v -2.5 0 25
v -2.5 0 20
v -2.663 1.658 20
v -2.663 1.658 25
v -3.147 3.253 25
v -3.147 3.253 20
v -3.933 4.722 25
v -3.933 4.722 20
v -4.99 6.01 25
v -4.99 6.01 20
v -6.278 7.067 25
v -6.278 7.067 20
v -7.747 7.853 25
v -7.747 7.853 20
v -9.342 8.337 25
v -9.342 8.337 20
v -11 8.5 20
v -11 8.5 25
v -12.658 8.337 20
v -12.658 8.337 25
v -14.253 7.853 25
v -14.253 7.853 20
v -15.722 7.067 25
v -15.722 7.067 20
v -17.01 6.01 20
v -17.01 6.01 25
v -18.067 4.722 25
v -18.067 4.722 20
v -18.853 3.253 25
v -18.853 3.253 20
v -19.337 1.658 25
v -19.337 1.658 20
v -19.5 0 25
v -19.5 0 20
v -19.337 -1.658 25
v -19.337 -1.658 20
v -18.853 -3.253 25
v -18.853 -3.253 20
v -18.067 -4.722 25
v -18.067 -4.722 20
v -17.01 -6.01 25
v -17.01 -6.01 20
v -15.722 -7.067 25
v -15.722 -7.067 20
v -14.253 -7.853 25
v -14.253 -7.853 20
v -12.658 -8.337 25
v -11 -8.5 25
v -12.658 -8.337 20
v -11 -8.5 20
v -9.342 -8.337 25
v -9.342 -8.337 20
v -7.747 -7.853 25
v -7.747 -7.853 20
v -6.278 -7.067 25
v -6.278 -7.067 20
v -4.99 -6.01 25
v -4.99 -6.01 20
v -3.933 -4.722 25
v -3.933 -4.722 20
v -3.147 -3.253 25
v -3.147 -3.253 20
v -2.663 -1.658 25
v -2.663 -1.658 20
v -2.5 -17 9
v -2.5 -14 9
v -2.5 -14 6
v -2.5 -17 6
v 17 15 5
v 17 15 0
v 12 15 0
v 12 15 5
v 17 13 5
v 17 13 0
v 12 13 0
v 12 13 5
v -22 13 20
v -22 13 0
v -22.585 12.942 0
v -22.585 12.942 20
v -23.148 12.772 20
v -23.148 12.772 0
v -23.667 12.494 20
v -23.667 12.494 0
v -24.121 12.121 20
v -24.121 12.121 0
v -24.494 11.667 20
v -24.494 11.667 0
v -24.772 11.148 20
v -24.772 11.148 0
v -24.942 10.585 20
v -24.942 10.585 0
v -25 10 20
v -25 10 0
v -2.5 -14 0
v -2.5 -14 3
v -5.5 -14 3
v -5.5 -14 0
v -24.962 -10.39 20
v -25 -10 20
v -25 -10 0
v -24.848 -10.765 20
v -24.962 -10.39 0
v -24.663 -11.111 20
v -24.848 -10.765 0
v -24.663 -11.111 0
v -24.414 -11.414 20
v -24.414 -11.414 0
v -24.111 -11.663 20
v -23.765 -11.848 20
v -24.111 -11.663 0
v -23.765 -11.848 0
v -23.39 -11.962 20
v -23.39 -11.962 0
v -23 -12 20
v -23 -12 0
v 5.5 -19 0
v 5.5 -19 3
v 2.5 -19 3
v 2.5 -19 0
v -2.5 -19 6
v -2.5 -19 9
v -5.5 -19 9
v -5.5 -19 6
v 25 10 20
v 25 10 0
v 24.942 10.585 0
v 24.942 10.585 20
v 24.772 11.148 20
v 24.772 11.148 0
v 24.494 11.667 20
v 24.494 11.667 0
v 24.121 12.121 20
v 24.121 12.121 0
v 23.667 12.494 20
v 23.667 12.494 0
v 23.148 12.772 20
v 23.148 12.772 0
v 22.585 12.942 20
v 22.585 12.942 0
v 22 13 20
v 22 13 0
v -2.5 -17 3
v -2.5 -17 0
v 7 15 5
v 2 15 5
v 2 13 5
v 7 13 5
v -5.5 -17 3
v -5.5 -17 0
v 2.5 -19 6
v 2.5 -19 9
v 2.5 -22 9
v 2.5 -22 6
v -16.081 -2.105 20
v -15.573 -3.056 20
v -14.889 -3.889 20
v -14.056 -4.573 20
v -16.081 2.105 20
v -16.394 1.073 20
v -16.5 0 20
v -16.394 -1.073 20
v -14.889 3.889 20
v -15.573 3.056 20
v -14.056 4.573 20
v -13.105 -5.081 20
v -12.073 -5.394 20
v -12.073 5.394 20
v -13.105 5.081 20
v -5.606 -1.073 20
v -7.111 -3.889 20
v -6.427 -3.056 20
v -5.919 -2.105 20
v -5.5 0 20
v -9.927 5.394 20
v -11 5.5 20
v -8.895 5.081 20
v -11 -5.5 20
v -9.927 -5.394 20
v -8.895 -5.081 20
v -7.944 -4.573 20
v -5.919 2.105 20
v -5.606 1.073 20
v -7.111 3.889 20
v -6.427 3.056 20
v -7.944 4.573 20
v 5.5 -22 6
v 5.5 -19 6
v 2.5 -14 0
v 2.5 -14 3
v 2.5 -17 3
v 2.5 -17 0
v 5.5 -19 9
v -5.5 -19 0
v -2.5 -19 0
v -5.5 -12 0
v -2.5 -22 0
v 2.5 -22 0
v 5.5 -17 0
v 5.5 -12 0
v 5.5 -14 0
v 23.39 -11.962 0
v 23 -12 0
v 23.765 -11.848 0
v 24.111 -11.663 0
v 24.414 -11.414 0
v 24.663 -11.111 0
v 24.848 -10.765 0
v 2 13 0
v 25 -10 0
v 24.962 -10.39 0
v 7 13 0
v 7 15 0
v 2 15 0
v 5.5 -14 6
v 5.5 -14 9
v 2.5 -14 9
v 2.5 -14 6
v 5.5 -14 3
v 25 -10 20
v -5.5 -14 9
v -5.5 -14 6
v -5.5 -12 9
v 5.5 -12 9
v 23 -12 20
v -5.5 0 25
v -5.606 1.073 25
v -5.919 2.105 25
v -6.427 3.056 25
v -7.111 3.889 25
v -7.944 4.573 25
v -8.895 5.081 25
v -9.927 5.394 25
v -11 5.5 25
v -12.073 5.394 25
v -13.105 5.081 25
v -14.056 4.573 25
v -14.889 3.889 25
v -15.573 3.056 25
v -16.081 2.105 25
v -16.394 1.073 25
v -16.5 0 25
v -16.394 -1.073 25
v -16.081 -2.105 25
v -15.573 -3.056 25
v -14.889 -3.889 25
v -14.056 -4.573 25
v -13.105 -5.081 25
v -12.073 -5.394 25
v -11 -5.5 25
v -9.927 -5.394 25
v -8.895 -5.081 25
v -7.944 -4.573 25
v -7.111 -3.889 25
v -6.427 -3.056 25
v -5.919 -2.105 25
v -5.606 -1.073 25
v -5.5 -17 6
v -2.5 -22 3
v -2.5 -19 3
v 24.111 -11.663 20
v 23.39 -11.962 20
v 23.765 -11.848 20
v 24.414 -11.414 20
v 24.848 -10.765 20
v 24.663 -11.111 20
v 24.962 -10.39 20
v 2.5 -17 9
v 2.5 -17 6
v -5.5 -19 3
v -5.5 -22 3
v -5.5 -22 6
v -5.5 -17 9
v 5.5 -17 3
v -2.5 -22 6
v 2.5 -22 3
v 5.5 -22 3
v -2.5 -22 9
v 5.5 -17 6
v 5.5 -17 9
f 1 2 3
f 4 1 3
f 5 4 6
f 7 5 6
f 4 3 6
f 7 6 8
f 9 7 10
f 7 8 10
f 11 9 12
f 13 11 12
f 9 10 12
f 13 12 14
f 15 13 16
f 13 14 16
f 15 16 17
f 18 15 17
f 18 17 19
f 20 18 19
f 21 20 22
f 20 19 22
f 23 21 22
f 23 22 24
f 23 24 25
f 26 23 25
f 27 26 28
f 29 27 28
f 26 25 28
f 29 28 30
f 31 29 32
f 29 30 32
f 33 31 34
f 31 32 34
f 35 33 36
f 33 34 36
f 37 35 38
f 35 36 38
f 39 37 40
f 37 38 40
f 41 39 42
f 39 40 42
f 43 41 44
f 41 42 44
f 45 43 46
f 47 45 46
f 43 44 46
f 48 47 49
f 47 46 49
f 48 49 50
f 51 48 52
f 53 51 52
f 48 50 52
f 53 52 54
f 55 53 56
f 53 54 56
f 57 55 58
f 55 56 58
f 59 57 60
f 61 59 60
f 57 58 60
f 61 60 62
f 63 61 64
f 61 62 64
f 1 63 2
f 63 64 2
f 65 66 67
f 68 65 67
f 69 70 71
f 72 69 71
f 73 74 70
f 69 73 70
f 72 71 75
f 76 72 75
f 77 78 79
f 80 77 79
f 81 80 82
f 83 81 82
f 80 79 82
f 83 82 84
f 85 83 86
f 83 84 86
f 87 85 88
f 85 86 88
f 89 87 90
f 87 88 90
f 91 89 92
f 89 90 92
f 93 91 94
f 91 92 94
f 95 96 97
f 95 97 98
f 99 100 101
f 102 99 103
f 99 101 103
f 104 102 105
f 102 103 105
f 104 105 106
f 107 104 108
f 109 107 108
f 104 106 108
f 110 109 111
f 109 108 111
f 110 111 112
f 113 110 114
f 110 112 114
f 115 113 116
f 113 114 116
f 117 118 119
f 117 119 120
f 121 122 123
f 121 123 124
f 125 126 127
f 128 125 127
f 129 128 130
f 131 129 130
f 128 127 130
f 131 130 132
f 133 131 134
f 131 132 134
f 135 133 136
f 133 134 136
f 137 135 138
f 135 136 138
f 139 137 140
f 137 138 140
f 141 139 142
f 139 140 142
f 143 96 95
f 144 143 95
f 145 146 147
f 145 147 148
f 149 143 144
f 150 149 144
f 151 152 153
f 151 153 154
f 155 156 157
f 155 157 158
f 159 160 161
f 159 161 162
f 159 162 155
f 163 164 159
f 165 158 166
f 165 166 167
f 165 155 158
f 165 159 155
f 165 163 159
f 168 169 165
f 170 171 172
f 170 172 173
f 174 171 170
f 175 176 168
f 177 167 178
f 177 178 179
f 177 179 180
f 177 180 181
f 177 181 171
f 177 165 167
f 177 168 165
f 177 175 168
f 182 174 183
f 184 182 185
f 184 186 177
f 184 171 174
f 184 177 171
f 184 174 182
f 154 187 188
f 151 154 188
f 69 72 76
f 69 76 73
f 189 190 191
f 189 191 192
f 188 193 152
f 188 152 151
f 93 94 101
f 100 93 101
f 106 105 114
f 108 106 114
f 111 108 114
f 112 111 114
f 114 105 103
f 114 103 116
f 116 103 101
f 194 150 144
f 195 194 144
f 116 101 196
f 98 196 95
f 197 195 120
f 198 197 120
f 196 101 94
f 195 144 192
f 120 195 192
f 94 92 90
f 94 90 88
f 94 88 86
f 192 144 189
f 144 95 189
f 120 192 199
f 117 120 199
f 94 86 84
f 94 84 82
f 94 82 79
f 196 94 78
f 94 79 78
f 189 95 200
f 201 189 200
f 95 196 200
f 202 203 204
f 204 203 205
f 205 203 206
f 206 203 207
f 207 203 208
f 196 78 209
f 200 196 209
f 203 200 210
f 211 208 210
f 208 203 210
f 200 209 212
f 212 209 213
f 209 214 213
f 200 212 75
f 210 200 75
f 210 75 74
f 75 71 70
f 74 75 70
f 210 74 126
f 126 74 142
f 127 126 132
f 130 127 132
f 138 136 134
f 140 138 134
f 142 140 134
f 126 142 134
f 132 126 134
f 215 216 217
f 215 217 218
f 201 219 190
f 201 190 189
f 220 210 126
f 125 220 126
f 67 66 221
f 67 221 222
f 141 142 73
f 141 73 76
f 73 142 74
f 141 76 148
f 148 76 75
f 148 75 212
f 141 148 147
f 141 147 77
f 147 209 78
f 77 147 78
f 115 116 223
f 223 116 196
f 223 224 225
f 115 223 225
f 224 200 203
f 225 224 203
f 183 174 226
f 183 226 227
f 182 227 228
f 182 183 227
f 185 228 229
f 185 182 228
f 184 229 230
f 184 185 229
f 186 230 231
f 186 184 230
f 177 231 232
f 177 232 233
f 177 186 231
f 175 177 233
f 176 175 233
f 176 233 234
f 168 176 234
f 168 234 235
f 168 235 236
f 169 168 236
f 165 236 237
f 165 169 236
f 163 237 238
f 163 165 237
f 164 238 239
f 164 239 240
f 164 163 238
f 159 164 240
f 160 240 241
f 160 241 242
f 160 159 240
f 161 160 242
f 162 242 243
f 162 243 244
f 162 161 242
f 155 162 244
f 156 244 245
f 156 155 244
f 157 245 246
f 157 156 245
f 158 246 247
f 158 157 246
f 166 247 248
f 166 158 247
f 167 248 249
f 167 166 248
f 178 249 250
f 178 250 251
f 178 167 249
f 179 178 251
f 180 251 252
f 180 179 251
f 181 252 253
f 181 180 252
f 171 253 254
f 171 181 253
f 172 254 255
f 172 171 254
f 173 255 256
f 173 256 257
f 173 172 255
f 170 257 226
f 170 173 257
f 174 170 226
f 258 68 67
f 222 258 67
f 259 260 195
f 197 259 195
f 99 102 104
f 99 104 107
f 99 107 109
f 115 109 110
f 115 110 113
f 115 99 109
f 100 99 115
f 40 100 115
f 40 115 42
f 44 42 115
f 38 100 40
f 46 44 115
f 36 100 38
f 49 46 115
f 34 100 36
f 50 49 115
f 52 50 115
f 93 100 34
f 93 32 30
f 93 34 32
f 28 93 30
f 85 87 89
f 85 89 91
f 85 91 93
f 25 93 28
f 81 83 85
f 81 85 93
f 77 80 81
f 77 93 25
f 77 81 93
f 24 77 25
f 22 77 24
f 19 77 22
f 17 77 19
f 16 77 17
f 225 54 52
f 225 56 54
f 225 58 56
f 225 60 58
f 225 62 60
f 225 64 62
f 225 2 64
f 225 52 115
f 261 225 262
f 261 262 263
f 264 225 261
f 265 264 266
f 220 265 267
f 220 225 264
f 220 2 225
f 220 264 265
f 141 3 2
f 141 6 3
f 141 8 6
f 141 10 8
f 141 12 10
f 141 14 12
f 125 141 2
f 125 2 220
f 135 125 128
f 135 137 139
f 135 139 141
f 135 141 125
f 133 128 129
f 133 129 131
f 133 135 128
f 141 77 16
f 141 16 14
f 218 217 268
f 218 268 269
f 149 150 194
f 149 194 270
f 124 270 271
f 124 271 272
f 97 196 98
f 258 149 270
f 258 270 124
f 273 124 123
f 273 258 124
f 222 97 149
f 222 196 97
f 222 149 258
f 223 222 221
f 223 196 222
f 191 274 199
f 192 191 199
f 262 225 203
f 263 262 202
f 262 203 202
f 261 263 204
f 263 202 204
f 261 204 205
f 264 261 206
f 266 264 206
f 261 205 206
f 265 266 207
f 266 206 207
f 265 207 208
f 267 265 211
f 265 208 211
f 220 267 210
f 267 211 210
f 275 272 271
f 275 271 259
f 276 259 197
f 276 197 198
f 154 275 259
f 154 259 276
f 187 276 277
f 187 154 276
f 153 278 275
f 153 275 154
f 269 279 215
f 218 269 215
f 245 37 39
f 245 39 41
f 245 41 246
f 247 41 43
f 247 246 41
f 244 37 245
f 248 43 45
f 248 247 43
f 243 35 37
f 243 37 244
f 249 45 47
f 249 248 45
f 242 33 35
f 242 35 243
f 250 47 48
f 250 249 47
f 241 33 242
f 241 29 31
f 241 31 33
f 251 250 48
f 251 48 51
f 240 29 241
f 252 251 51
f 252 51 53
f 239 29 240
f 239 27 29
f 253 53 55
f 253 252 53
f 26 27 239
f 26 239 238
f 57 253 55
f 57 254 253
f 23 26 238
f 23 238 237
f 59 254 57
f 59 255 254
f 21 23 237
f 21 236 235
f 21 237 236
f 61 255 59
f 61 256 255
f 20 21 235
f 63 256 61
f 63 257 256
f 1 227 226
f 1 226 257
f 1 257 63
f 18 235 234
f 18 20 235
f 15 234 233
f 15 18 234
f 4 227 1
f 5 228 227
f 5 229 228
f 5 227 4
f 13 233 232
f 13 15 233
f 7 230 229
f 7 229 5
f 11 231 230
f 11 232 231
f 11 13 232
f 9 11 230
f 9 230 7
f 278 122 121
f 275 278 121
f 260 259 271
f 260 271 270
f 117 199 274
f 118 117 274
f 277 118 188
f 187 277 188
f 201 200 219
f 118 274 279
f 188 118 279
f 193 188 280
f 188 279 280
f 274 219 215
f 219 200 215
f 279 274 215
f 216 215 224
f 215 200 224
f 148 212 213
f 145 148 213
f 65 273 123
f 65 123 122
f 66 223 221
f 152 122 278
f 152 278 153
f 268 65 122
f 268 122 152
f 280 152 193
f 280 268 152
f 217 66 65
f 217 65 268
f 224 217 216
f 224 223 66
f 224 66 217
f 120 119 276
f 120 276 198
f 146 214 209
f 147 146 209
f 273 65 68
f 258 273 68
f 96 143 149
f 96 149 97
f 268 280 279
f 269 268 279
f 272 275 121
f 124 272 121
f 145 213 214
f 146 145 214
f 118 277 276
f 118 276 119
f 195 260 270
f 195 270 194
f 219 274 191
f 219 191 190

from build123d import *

# Parameters (mm, degrees)
BOSS_EXTRUDE1_DEPTH = 20
SKETCH2_W           = 5
SKETCH2_H           = 2
CUT_EXTRUDE1_DEPTH  = 15
SKETCH3_R           = 8.5
SKETCH3_R_2         = 5.5
BOSS_EXTRUDE2_DEPTH = 5
SKETCH4_W           = 11
SKETCH4_H           = 9
BOSS_EXTRUDE3_DEPTH = 10
SKETCH5_W           = 3
SKETCH5_H           = 3
CUT_EXTRUDE2_DEPTH  = 3
CUT_EXTRUDE3_START  = -8
SKETCH5_2_W         = 3
SKETCH5_2_H         = 3
CUT_EXTRUDE3_DEPTH  = 3


with BuildPart() as part:
    # Sketch1 → Boss-Extrude1 (new body)
    with BuildSketch(Plane.XY):
        with BuildLine():
            Line((-25, 10), (-25, -10))
            ThreePointArc((-25, -10), (-24.414213562, -11.414213562), (-23, -12))
            Line((-23, -12), (23, -12))
            ThreePointArc((23, -12), (24.414213562, -11.414213562), (25, -10))
            Line((25, -10), (25, 10))
            ThreePointArc((25, 10), (24.121320344, 12.121320344), (22, 13))
            Line((22, 13), (17, 13))
            Line((17, 13), (17, 15))
            Line((17, 15), (12, 15))
            Line((12, 15), (12, 13))
            Line((12, 13), (7, 13))
            Line((7, 13), (7, 15))
            Line((7, 15), (2, 15))
            Line((2, 15), (2, 13))
            Line((2, 13), (-22, 13))
            ThreePointArc((-22, 13), (-24.121320344, 12.121320344), (-25, 10))
        make_face()
    extrude(amount=BOSS_EXTRUDE1_DEPTH)

    # Sketch2 → Cut-Extrude1 (cut)
    with BuildSketch(Plane.XY.offset(20)):
        with Locations((4.5, 14)):
            Rectangle(SKETCH2_W, SKETCH2_H)
        with Locations((14.5, 14)):
            Rectangle(SKETCH2_W, SKETCH2_H)
    extrude(amount=-CUT_EXTRUDE1_DEPTH, mode=Mode.SUBTRACT)

    # Sketch3 → Boss-Extrude2 (add)
    with BuildSketch(Plane.XY.offset(20)):
        with Locations((-11, 0)):
            Circle(SKETCH3_R)
        with Locations((-11, 0)):
            Circle(SKETCH3_R_2, mode=Mode.SUBTRACT)
    extrude(amount=BOSS_EXTRUDE2_DEPTH)

    # Sketch4 → Boss-Extrude3 (add)
    with BuildSketch(Plane.XZ.offset(12)):
        with Locations((0, 4.5)):
            Rectangle(SKETCH4_W, SKETCH4_H)
    extrude(amount=BOSS_EXTRUDE3_DEPTH)

    # Sketch5 → Cut-Extrude2 (cut)
    with BuildSketch(Plane(origin=(5.5, 0, 0), x_dir=(0, 0, -1), z_dir=(1, 0, 0))):
        with Locations((-7.5, -20.5)):
            Rectangle(SKETCH5_W, SKETCH5_H)
        with Locations((-1.5, -20.5)):
            Rectangle(SKETCH5_W, SKETCH5_H)
        with Locations((-7.5, -15.5)):
            Rectangle(SKETCH5_W, SKETCH5_H)
        with Locations((-1.5, -15.5)):
            Rectangle(SKETCH5_W, SKETCH5_H)
    extrude(amount=-CUT_EXTRUDE2_DEPTH, mode=Mode.SUBTRACT)

    # Sketch5<2> → Cut-Extrude3 (cut)
    with BuildSketch(Plane(origin=(5.5, 0, 0), x_dir=(0, 0, -1), z_dir=(1, 0, 0)).offset(CUT_EXTRUDE3_START)):
        with Locations((-7.5, -20.5)):
            Rectangle(SKETCH5_2_W, SKETCH5_2_H)
        with Locations((-1.5, -20.5)):
            Rectangle(SKETCH5_2_W, SKETCH5_2_H)
        with Locations((-7.5, -15.5)):
            Rectangle(SKETCH5_2_W, SKETCH5_2_H)
        with Locations((-1.5, -15.5)):
            Rectangle(SKETCH5_2_W, SKETCH5_2_H)
    extrude(amount=-CUT_EXTRUDE3_DEPTH, mode=Mode.SUBTRACT)


solid = part.part
